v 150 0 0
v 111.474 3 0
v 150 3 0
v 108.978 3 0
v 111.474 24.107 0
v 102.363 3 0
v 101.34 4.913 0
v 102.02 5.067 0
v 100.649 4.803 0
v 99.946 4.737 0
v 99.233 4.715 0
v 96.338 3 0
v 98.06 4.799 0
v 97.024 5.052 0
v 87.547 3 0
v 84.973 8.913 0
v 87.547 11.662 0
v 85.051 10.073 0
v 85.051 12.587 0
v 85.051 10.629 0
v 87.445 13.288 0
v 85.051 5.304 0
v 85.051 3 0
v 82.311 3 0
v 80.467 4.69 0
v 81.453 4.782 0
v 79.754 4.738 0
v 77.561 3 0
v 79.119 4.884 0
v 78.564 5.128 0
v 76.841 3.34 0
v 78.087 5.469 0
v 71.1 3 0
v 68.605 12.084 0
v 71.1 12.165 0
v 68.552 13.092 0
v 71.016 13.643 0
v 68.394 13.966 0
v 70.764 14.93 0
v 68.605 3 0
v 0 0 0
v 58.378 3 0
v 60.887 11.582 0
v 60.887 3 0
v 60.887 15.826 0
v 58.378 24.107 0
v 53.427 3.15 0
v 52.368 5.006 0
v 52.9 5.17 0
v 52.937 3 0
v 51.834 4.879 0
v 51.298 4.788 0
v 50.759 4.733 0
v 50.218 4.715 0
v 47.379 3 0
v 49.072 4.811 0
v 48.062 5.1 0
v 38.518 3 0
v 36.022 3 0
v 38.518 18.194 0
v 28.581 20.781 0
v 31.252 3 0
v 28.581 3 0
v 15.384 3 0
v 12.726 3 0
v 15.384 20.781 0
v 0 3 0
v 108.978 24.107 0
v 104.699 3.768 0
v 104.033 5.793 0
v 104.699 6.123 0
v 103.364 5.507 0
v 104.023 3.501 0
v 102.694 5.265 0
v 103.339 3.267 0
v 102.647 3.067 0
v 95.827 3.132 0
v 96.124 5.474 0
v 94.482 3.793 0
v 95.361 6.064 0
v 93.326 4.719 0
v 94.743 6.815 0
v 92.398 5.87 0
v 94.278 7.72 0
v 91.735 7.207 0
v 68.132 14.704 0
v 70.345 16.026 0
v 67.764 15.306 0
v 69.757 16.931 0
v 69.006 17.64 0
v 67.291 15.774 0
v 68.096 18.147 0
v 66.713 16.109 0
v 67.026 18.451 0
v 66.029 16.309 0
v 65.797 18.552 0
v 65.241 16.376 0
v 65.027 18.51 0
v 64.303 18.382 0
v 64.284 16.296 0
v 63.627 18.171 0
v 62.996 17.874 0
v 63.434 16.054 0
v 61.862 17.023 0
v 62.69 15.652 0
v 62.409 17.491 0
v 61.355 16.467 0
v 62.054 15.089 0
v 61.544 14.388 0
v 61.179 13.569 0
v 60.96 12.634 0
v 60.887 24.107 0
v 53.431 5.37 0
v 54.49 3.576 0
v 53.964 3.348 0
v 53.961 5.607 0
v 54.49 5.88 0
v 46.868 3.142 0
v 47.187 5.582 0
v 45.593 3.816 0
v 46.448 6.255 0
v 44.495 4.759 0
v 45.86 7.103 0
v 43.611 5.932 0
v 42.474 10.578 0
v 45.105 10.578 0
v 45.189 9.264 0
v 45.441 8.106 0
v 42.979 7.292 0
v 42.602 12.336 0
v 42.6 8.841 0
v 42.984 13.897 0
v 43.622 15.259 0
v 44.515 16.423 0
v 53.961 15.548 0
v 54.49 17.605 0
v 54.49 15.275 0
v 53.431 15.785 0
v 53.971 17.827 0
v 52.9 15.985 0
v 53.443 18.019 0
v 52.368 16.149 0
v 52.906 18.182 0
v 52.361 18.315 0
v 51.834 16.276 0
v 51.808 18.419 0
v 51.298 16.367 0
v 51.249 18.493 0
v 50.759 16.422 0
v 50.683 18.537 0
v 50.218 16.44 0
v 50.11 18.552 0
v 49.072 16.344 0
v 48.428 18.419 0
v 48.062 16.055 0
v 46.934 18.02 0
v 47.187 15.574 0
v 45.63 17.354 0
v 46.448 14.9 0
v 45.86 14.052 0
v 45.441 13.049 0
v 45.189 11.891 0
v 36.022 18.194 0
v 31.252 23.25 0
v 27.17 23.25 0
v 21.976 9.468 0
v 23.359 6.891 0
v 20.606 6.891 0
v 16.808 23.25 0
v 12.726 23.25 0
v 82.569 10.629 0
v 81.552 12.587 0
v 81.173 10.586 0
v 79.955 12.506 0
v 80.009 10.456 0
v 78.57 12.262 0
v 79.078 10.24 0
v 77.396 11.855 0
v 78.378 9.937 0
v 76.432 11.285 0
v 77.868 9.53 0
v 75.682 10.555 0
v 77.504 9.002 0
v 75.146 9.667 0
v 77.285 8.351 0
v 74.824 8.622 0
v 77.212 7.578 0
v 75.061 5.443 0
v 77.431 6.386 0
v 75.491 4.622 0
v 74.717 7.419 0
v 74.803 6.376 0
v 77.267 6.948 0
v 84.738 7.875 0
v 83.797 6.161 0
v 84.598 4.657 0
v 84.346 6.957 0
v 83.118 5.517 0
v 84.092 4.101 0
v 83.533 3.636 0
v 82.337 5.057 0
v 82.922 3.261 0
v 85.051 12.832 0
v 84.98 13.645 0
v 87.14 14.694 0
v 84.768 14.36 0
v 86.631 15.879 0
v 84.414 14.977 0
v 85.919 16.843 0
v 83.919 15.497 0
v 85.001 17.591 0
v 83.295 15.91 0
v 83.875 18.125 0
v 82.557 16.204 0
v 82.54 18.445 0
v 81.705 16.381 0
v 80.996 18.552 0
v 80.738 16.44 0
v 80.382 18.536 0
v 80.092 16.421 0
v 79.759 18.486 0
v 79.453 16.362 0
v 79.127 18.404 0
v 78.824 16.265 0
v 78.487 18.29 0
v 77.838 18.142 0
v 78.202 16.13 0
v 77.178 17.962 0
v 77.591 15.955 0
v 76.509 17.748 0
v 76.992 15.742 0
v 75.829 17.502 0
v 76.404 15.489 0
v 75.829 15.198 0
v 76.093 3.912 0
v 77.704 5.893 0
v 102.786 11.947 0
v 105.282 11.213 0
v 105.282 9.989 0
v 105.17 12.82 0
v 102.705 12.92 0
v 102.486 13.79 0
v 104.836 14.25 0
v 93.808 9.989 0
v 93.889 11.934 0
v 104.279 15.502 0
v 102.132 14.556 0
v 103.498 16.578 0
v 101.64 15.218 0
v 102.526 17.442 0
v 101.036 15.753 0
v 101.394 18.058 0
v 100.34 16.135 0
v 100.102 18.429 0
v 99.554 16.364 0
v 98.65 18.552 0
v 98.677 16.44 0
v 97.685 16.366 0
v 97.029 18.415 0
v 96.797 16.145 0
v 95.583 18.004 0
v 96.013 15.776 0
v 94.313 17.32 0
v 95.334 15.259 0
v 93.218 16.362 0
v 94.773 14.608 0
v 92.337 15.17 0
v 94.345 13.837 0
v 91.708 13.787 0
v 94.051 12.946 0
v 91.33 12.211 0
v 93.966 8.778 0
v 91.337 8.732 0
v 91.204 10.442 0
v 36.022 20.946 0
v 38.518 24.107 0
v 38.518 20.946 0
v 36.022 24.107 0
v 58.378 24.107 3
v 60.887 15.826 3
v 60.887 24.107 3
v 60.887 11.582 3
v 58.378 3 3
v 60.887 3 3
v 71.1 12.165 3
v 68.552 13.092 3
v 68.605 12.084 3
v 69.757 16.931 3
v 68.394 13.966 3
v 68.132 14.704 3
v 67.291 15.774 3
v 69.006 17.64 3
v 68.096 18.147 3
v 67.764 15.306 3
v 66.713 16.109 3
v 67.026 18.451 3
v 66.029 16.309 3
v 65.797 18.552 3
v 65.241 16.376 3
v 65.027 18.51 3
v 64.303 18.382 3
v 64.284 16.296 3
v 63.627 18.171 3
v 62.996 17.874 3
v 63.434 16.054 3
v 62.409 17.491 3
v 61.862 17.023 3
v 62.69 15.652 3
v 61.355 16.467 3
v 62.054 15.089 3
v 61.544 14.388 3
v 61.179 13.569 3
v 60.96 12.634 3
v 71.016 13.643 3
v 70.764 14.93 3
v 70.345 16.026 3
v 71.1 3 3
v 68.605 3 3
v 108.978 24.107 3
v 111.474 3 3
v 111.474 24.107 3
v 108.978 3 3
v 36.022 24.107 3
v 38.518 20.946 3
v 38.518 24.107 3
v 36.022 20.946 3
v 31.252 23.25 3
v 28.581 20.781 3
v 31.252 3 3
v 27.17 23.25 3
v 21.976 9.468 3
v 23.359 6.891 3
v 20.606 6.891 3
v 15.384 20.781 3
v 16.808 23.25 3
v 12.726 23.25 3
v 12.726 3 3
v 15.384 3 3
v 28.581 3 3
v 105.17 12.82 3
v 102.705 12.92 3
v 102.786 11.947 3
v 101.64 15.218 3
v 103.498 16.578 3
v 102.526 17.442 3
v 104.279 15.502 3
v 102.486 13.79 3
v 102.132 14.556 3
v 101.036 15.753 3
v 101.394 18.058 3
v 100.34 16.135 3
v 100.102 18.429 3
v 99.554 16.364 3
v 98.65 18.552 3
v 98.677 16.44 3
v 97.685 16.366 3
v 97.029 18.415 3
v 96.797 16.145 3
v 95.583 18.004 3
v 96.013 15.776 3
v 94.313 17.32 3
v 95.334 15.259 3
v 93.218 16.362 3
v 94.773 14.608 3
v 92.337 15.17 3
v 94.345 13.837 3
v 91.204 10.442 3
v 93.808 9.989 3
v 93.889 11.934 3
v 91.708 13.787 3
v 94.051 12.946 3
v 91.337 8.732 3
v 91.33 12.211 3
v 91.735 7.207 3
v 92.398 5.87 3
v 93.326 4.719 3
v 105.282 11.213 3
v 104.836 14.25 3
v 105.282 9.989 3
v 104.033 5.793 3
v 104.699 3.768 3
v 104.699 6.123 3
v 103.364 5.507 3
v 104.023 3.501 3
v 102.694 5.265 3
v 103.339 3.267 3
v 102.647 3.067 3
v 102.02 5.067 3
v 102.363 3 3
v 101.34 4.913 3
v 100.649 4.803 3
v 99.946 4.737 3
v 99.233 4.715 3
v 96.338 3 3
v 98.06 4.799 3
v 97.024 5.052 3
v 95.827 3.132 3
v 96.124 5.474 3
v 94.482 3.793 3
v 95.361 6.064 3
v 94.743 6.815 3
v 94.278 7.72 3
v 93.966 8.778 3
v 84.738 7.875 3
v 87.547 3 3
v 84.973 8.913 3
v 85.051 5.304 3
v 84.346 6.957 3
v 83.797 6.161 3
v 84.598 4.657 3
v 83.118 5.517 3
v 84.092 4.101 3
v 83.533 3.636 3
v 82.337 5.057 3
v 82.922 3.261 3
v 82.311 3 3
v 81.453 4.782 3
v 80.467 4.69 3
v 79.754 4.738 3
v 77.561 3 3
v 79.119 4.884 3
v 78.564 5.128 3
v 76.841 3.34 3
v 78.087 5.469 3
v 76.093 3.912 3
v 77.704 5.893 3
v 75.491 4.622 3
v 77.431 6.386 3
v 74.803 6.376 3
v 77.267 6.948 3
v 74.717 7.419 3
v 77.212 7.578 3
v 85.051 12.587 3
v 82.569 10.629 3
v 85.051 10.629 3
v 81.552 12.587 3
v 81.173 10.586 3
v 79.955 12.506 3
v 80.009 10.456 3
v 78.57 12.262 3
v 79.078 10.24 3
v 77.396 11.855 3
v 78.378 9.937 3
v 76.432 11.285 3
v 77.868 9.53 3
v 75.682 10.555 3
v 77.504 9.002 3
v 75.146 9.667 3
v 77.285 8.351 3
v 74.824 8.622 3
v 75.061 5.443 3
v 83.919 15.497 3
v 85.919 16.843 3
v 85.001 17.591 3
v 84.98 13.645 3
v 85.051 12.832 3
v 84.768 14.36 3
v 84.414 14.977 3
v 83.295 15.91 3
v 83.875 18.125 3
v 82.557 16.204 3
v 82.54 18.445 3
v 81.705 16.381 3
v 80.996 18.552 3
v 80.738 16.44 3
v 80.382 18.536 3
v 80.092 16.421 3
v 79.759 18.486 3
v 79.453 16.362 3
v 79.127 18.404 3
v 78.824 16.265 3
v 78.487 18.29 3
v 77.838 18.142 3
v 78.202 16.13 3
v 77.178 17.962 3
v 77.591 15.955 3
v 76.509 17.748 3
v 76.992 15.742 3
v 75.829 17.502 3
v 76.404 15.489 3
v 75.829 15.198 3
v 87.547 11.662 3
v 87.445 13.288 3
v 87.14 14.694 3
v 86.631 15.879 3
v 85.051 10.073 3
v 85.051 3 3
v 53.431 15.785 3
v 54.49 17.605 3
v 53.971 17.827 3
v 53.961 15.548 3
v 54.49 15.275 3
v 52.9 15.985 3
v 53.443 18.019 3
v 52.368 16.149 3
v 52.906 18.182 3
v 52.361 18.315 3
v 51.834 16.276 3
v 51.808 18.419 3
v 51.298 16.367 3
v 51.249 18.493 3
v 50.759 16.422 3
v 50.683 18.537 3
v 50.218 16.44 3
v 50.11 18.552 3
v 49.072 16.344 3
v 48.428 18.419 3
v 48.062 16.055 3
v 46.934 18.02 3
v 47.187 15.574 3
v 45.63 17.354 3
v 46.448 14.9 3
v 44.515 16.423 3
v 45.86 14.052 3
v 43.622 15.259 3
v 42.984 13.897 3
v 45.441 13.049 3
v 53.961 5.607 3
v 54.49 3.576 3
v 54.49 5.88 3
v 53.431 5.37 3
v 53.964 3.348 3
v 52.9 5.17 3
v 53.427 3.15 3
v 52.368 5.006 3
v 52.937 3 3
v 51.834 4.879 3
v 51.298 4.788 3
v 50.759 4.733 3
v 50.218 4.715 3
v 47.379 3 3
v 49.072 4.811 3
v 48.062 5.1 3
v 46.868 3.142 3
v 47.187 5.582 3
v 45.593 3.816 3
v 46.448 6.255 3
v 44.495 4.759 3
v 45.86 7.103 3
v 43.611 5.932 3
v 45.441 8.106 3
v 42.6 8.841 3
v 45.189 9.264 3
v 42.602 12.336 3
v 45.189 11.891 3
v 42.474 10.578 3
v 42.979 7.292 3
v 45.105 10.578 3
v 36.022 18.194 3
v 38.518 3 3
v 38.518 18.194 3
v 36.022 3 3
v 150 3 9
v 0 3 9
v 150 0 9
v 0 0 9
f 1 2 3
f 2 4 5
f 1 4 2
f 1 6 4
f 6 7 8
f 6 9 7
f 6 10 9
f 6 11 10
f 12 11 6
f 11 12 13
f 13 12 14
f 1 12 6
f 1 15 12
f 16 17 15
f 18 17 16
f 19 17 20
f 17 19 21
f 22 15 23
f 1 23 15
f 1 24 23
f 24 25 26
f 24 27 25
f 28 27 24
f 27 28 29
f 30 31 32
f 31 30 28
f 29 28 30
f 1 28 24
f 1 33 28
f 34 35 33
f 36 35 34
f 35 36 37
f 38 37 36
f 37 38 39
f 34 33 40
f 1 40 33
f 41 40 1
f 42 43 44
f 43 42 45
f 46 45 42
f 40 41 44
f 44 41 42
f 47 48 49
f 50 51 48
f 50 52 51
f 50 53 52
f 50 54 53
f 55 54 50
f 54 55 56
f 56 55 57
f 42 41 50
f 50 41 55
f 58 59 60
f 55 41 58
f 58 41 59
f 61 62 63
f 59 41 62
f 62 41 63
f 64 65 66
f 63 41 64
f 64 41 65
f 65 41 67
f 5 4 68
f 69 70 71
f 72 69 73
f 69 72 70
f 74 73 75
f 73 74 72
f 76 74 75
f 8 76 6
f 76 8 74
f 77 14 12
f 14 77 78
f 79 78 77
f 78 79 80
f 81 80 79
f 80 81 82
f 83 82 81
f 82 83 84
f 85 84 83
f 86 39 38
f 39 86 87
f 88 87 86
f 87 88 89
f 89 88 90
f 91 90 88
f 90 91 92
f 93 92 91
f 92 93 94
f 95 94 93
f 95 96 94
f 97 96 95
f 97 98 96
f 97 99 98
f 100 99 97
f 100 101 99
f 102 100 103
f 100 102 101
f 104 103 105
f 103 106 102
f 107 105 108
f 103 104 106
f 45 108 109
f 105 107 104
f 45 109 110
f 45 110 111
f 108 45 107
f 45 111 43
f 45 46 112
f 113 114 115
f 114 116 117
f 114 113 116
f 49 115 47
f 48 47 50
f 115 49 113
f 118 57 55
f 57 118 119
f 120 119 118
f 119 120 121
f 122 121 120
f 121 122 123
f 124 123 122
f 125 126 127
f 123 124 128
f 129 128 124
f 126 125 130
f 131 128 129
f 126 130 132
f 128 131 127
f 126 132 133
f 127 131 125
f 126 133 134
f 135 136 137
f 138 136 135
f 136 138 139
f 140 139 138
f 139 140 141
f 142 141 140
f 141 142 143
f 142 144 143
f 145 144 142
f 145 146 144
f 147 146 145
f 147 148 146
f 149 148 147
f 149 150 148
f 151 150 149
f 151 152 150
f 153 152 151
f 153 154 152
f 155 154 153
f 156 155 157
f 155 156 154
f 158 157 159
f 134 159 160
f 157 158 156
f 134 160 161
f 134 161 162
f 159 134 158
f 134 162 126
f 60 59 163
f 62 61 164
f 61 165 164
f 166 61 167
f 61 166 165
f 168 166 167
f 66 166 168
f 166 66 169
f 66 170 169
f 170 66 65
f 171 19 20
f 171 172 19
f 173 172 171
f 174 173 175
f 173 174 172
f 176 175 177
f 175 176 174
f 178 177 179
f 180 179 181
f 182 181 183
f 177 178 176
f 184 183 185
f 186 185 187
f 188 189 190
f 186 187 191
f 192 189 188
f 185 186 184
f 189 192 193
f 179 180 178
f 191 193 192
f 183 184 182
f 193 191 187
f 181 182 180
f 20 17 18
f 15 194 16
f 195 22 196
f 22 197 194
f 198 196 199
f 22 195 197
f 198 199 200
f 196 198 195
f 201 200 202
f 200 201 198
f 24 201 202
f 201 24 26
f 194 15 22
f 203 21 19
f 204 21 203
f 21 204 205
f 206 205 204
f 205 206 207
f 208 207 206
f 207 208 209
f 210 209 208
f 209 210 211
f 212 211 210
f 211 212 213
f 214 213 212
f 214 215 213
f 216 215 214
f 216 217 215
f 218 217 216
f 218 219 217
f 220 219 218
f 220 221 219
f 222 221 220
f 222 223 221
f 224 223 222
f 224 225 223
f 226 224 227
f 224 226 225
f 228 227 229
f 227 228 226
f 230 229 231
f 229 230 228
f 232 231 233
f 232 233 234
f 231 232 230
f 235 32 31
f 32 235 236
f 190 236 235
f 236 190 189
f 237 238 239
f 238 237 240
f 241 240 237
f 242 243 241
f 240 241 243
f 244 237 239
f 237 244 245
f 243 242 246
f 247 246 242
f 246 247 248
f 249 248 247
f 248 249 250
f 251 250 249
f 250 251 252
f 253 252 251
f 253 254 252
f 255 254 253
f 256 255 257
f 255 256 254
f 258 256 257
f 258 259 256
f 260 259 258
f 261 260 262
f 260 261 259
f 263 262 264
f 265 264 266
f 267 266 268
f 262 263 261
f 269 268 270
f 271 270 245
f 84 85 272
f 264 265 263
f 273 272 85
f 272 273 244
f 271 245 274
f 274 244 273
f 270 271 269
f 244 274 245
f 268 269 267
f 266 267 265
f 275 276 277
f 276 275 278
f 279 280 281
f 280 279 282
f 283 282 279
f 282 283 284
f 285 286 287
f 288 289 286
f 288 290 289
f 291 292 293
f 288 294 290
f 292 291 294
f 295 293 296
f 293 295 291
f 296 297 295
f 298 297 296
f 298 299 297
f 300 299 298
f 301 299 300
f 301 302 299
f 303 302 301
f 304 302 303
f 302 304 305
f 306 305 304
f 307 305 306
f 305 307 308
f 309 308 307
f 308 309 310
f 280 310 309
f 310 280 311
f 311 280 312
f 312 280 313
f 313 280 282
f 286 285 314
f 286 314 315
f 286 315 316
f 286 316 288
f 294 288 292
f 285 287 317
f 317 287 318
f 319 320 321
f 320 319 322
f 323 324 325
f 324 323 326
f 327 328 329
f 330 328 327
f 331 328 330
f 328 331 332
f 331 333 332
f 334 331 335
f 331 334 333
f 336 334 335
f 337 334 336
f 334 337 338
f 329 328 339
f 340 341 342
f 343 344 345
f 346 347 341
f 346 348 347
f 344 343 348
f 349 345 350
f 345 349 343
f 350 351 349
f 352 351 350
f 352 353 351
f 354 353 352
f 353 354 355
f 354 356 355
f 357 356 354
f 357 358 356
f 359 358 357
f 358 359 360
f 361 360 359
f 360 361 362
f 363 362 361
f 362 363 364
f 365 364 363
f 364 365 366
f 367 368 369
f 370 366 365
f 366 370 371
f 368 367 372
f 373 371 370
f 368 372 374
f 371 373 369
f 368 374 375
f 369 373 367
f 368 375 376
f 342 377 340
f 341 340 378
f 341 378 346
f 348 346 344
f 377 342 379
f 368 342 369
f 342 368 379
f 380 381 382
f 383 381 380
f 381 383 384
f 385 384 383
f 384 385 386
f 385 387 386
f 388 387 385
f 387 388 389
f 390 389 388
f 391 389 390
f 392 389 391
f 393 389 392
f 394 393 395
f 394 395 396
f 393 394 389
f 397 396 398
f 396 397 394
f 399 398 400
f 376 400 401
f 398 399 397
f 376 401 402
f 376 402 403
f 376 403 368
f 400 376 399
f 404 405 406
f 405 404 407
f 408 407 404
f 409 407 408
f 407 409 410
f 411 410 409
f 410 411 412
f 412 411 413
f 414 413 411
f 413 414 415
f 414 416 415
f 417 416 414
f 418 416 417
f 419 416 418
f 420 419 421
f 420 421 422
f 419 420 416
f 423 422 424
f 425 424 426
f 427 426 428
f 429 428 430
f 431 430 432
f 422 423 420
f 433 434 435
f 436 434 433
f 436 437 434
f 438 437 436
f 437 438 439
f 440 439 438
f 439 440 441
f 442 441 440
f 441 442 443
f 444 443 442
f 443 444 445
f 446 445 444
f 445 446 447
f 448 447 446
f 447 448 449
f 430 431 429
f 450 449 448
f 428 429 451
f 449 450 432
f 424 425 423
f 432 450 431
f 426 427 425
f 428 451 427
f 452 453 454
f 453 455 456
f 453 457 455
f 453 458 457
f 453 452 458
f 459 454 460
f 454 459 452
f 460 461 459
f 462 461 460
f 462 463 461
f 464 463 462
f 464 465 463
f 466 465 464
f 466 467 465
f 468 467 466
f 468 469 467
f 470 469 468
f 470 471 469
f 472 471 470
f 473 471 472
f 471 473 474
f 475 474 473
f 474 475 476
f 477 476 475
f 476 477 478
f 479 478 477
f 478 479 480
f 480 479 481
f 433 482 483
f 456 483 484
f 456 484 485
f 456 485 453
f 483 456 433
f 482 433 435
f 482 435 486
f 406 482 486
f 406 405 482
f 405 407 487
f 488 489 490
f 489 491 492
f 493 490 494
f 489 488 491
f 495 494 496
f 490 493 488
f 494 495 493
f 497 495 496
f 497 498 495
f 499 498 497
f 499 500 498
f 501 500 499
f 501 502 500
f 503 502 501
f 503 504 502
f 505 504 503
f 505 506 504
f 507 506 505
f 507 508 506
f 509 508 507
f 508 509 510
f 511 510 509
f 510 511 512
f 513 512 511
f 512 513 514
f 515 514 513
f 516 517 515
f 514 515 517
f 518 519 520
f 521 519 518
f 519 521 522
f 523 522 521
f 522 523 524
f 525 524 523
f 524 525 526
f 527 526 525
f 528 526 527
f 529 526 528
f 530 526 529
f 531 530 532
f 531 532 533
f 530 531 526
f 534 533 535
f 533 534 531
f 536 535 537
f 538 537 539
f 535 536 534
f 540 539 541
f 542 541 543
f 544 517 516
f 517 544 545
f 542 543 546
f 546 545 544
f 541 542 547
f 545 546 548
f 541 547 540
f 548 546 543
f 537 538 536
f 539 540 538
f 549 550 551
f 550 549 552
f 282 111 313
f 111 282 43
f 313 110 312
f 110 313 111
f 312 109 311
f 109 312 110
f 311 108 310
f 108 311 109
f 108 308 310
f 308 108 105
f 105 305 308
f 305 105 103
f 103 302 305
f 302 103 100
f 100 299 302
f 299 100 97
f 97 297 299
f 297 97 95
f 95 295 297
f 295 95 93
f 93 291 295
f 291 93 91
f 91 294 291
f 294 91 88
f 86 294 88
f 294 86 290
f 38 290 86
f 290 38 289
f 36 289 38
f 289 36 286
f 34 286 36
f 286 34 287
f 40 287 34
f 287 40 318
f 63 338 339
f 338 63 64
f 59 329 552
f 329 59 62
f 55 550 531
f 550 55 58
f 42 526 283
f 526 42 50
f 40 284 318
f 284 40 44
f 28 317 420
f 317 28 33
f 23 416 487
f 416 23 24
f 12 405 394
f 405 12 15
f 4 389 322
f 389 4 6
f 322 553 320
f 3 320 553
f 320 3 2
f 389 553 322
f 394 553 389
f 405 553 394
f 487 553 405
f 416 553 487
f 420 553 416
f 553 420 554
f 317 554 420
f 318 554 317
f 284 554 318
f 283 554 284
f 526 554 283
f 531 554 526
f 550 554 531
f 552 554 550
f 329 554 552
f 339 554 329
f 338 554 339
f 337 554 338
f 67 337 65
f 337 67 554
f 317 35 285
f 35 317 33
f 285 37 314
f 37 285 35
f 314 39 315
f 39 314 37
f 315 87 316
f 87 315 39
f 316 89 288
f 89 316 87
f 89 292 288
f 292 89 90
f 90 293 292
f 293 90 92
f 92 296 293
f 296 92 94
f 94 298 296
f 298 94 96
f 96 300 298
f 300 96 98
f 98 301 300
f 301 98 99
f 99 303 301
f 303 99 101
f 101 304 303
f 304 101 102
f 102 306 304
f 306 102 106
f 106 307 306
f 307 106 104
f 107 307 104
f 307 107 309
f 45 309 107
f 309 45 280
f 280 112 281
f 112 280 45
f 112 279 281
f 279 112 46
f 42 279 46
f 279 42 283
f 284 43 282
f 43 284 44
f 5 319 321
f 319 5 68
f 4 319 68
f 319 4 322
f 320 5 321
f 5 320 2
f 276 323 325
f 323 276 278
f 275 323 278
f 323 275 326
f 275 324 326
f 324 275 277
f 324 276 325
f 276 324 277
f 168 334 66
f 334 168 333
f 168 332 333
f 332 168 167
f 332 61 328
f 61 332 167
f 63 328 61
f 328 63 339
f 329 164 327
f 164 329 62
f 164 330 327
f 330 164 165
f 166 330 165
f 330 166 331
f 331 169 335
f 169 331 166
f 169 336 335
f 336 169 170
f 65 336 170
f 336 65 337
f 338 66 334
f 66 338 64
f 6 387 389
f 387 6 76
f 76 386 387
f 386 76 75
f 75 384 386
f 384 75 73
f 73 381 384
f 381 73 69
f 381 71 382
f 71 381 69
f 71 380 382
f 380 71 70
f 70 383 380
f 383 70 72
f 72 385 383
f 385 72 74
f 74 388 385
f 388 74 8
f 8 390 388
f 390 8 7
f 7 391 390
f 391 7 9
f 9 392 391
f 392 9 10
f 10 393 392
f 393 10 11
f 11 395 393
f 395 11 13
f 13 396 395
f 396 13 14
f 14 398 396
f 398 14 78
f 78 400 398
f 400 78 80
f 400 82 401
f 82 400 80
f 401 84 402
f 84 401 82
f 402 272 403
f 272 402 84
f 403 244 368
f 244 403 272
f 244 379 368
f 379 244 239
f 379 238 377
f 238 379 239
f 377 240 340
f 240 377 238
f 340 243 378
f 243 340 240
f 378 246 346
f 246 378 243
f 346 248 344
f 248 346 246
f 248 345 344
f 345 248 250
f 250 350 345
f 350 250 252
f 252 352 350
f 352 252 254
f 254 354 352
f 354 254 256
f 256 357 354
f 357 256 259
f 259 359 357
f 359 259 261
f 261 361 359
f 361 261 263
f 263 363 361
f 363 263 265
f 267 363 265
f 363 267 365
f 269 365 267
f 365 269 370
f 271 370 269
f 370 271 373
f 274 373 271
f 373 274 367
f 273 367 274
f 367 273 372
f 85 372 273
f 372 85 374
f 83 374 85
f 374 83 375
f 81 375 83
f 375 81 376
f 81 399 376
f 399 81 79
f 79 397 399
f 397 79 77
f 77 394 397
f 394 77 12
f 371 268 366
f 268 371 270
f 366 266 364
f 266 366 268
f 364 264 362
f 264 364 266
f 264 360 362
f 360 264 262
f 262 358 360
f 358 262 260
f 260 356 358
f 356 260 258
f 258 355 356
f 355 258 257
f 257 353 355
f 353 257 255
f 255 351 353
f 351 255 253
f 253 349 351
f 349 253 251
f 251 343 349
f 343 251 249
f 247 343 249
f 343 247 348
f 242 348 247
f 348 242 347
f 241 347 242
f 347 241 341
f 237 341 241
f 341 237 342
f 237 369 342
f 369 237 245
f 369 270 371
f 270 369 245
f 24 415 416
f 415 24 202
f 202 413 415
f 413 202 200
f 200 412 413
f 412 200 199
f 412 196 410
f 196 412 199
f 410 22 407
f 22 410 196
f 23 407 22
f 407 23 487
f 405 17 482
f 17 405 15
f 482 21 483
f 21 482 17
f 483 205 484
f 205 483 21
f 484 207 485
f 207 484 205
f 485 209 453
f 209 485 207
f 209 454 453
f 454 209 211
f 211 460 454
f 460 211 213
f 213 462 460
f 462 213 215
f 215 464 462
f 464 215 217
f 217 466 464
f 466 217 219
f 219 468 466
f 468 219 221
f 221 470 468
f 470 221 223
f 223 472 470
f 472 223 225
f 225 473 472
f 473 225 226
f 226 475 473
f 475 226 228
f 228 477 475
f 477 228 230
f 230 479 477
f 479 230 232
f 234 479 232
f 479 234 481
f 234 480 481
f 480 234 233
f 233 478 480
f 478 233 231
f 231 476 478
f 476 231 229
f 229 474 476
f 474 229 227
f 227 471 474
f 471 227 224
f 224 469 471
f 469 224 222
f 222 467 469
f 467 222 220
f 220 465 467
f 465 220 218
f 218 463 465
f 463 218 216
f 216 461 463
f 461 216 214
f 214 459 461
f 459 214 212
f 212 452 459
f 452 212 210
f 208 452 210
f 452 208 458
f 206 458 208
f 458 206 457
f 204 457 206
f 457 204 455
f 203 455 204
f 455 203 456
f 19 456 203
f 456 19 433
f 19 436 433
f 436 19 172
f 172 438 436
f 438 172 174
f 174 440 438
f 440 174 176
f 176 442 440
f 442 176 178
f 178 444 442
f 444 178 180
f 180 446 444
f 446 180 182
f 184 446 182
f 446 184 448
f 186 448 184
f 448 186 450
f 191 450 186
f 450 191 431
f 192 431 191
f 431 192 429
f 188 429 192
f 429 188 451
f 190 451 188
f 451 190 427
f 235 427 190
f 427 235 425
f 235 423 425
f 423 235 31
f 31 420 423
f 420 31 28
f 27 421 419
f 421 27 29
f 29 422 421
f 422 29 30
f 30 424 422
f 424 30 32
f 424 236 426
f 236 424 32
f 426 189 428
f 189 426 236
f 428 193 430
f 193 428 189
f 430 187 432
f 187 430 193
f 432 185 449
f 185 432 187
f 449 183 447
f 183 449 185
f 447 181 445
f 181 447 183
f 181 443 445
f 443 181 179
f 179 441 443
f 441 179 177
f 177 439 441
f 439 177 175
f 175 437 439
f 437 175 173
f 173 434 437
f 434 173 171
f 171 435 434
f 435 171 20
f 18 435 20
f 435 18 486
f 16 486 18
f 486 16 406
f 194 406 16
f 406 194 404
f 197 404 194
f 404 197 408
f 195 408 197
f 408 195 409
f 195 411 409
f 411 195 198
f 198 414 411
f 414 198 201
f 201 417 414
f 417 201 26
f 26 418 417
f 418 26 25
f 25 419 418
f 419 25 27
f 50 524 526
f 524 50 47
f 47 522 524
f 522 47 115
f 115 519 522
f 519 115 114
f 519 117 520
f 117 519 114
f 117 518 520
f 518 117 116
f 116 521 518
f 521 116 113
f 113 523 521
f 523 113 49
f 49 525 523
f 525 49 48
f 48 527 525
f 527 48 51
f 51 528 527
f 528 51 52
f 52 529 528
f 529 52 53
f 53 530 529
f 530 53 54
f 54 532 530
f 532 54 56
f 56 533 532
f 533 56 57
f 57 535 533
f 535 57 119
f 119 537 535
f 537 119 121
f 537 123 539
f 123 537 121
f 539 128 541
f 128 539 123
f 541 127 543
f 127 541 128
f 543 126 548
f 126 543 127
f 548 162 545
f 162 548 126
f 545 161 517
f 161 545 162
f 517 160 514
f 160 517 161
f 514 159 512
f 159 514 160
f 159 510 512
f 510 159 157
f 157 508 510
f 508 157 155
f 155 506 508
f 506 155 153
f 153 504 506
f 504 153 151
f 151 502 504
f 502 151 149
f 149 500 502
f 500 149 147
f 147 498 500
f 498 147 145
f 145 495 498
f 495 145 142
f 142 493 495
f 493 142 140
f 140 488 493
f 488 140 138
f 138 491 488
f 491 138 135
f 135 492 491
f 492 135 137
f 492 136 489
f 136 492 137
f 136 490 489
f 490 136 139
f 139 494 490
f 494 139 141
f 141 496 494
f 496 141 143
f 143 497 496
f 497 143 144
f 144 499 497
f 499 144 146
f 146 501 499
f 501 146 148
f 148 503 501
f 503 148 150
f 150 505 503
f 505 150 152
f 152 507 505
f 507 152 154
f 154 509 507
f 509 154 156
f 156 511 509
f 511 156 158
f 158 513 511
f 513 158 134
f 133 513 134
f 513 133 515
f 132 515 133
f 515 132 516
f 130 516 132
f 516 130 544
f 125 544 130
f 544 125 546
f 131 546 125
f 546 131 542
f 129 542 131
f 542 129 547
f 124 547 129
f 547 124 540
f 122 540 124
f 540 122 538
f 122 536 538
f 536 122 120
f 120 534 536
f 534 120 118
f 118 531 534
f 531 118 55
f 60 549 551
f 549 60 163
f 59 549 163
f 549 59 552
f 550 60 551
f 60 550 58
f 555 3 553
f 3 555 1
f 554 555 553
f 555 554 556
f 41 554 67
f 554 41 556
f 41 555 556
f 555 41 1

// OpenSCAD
translate([10, 3, 0])
linear_extrude(height=3)
    text("Michael", 20, "Cascadia Code Semibold");

cube([150, 3, 9]);
